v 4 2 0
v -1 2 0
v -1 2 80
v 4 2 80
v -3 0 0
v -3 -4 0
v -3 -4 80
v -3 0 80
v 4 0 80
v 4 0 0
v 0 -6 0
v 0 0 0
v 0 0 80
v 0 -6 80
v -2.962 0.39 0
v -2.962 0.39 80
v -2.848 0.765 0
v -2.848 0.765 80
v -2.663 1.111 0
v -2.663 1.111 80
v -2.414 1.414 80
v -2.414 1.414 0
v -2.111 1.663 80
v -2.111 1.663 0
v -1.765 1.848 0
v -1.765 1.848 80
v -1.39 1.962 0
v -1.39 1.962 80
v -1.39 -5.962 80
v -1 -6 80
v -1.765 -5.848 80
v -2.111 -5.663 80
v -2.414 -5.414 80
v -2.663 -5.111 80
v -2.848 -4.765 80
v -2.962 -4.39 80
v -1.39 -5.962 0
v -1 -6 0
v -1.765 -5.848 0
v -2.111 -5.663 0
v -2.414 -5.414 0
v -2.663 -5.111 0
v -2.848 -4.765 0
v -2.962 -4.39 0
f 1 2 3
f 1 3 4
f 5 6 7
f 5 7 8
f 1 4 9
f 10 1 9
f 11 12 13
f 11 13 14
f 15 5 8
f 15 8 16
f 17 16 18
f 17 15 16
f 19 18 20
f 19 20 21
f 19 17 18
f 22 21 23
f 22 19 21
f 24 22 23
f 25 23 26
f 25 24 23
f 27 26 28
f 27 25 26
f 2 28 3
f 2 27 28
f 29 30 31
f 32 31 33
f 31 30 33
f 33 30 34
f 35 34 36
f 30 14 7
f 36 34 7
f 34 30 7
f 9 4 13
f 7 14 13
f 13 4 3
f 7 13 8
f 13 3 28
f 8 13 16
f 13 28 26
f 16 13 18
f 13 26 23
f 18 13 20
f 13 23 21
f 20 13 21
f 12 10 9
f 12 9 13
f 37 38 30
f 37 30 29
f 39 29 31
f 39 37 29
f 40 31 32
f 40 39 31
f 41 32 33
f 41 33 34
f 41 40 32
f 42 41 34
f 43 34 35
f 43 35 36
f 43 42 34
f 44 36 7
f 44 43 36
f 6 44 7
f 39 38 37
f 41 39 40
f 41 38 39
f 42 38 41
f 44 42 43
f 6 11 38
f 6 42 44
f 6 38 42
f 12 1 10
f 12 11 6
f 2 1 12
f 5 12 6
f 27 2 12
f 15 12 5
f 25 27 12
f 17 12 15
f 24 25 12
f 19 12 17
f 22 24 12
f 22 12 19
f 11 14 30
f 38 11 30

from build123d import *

# Parameters (mm, degrees)
BOSS_EXTRUDE1_DEPTH = 80


with BuildPart() as part:
    # Sketch1 → Boss-Extrude1 (new body)
    with BuildSketch(Plane.XY):
        with BuildLine():
            Line((0, 0), (0, -6))
            Line((0, -6), (-1, -6))
            ThreePointArc((-1, -6), (-2.414213562, -5.414213562), (-3, -4))
            Line((-3, -4), (-3, 0))
            ThreePointArc((-3, 0), (-2.414213562, 1.414213562), (-1, 2))
            Line((-1, 2), (4, 2))
            Line((4, 2), (4, 0))
            Line((4, 0), (0, 0))
        make_face()
    extrude(amount=BOSS_EXTRUDE1_DEPTH)


solid = part.part
